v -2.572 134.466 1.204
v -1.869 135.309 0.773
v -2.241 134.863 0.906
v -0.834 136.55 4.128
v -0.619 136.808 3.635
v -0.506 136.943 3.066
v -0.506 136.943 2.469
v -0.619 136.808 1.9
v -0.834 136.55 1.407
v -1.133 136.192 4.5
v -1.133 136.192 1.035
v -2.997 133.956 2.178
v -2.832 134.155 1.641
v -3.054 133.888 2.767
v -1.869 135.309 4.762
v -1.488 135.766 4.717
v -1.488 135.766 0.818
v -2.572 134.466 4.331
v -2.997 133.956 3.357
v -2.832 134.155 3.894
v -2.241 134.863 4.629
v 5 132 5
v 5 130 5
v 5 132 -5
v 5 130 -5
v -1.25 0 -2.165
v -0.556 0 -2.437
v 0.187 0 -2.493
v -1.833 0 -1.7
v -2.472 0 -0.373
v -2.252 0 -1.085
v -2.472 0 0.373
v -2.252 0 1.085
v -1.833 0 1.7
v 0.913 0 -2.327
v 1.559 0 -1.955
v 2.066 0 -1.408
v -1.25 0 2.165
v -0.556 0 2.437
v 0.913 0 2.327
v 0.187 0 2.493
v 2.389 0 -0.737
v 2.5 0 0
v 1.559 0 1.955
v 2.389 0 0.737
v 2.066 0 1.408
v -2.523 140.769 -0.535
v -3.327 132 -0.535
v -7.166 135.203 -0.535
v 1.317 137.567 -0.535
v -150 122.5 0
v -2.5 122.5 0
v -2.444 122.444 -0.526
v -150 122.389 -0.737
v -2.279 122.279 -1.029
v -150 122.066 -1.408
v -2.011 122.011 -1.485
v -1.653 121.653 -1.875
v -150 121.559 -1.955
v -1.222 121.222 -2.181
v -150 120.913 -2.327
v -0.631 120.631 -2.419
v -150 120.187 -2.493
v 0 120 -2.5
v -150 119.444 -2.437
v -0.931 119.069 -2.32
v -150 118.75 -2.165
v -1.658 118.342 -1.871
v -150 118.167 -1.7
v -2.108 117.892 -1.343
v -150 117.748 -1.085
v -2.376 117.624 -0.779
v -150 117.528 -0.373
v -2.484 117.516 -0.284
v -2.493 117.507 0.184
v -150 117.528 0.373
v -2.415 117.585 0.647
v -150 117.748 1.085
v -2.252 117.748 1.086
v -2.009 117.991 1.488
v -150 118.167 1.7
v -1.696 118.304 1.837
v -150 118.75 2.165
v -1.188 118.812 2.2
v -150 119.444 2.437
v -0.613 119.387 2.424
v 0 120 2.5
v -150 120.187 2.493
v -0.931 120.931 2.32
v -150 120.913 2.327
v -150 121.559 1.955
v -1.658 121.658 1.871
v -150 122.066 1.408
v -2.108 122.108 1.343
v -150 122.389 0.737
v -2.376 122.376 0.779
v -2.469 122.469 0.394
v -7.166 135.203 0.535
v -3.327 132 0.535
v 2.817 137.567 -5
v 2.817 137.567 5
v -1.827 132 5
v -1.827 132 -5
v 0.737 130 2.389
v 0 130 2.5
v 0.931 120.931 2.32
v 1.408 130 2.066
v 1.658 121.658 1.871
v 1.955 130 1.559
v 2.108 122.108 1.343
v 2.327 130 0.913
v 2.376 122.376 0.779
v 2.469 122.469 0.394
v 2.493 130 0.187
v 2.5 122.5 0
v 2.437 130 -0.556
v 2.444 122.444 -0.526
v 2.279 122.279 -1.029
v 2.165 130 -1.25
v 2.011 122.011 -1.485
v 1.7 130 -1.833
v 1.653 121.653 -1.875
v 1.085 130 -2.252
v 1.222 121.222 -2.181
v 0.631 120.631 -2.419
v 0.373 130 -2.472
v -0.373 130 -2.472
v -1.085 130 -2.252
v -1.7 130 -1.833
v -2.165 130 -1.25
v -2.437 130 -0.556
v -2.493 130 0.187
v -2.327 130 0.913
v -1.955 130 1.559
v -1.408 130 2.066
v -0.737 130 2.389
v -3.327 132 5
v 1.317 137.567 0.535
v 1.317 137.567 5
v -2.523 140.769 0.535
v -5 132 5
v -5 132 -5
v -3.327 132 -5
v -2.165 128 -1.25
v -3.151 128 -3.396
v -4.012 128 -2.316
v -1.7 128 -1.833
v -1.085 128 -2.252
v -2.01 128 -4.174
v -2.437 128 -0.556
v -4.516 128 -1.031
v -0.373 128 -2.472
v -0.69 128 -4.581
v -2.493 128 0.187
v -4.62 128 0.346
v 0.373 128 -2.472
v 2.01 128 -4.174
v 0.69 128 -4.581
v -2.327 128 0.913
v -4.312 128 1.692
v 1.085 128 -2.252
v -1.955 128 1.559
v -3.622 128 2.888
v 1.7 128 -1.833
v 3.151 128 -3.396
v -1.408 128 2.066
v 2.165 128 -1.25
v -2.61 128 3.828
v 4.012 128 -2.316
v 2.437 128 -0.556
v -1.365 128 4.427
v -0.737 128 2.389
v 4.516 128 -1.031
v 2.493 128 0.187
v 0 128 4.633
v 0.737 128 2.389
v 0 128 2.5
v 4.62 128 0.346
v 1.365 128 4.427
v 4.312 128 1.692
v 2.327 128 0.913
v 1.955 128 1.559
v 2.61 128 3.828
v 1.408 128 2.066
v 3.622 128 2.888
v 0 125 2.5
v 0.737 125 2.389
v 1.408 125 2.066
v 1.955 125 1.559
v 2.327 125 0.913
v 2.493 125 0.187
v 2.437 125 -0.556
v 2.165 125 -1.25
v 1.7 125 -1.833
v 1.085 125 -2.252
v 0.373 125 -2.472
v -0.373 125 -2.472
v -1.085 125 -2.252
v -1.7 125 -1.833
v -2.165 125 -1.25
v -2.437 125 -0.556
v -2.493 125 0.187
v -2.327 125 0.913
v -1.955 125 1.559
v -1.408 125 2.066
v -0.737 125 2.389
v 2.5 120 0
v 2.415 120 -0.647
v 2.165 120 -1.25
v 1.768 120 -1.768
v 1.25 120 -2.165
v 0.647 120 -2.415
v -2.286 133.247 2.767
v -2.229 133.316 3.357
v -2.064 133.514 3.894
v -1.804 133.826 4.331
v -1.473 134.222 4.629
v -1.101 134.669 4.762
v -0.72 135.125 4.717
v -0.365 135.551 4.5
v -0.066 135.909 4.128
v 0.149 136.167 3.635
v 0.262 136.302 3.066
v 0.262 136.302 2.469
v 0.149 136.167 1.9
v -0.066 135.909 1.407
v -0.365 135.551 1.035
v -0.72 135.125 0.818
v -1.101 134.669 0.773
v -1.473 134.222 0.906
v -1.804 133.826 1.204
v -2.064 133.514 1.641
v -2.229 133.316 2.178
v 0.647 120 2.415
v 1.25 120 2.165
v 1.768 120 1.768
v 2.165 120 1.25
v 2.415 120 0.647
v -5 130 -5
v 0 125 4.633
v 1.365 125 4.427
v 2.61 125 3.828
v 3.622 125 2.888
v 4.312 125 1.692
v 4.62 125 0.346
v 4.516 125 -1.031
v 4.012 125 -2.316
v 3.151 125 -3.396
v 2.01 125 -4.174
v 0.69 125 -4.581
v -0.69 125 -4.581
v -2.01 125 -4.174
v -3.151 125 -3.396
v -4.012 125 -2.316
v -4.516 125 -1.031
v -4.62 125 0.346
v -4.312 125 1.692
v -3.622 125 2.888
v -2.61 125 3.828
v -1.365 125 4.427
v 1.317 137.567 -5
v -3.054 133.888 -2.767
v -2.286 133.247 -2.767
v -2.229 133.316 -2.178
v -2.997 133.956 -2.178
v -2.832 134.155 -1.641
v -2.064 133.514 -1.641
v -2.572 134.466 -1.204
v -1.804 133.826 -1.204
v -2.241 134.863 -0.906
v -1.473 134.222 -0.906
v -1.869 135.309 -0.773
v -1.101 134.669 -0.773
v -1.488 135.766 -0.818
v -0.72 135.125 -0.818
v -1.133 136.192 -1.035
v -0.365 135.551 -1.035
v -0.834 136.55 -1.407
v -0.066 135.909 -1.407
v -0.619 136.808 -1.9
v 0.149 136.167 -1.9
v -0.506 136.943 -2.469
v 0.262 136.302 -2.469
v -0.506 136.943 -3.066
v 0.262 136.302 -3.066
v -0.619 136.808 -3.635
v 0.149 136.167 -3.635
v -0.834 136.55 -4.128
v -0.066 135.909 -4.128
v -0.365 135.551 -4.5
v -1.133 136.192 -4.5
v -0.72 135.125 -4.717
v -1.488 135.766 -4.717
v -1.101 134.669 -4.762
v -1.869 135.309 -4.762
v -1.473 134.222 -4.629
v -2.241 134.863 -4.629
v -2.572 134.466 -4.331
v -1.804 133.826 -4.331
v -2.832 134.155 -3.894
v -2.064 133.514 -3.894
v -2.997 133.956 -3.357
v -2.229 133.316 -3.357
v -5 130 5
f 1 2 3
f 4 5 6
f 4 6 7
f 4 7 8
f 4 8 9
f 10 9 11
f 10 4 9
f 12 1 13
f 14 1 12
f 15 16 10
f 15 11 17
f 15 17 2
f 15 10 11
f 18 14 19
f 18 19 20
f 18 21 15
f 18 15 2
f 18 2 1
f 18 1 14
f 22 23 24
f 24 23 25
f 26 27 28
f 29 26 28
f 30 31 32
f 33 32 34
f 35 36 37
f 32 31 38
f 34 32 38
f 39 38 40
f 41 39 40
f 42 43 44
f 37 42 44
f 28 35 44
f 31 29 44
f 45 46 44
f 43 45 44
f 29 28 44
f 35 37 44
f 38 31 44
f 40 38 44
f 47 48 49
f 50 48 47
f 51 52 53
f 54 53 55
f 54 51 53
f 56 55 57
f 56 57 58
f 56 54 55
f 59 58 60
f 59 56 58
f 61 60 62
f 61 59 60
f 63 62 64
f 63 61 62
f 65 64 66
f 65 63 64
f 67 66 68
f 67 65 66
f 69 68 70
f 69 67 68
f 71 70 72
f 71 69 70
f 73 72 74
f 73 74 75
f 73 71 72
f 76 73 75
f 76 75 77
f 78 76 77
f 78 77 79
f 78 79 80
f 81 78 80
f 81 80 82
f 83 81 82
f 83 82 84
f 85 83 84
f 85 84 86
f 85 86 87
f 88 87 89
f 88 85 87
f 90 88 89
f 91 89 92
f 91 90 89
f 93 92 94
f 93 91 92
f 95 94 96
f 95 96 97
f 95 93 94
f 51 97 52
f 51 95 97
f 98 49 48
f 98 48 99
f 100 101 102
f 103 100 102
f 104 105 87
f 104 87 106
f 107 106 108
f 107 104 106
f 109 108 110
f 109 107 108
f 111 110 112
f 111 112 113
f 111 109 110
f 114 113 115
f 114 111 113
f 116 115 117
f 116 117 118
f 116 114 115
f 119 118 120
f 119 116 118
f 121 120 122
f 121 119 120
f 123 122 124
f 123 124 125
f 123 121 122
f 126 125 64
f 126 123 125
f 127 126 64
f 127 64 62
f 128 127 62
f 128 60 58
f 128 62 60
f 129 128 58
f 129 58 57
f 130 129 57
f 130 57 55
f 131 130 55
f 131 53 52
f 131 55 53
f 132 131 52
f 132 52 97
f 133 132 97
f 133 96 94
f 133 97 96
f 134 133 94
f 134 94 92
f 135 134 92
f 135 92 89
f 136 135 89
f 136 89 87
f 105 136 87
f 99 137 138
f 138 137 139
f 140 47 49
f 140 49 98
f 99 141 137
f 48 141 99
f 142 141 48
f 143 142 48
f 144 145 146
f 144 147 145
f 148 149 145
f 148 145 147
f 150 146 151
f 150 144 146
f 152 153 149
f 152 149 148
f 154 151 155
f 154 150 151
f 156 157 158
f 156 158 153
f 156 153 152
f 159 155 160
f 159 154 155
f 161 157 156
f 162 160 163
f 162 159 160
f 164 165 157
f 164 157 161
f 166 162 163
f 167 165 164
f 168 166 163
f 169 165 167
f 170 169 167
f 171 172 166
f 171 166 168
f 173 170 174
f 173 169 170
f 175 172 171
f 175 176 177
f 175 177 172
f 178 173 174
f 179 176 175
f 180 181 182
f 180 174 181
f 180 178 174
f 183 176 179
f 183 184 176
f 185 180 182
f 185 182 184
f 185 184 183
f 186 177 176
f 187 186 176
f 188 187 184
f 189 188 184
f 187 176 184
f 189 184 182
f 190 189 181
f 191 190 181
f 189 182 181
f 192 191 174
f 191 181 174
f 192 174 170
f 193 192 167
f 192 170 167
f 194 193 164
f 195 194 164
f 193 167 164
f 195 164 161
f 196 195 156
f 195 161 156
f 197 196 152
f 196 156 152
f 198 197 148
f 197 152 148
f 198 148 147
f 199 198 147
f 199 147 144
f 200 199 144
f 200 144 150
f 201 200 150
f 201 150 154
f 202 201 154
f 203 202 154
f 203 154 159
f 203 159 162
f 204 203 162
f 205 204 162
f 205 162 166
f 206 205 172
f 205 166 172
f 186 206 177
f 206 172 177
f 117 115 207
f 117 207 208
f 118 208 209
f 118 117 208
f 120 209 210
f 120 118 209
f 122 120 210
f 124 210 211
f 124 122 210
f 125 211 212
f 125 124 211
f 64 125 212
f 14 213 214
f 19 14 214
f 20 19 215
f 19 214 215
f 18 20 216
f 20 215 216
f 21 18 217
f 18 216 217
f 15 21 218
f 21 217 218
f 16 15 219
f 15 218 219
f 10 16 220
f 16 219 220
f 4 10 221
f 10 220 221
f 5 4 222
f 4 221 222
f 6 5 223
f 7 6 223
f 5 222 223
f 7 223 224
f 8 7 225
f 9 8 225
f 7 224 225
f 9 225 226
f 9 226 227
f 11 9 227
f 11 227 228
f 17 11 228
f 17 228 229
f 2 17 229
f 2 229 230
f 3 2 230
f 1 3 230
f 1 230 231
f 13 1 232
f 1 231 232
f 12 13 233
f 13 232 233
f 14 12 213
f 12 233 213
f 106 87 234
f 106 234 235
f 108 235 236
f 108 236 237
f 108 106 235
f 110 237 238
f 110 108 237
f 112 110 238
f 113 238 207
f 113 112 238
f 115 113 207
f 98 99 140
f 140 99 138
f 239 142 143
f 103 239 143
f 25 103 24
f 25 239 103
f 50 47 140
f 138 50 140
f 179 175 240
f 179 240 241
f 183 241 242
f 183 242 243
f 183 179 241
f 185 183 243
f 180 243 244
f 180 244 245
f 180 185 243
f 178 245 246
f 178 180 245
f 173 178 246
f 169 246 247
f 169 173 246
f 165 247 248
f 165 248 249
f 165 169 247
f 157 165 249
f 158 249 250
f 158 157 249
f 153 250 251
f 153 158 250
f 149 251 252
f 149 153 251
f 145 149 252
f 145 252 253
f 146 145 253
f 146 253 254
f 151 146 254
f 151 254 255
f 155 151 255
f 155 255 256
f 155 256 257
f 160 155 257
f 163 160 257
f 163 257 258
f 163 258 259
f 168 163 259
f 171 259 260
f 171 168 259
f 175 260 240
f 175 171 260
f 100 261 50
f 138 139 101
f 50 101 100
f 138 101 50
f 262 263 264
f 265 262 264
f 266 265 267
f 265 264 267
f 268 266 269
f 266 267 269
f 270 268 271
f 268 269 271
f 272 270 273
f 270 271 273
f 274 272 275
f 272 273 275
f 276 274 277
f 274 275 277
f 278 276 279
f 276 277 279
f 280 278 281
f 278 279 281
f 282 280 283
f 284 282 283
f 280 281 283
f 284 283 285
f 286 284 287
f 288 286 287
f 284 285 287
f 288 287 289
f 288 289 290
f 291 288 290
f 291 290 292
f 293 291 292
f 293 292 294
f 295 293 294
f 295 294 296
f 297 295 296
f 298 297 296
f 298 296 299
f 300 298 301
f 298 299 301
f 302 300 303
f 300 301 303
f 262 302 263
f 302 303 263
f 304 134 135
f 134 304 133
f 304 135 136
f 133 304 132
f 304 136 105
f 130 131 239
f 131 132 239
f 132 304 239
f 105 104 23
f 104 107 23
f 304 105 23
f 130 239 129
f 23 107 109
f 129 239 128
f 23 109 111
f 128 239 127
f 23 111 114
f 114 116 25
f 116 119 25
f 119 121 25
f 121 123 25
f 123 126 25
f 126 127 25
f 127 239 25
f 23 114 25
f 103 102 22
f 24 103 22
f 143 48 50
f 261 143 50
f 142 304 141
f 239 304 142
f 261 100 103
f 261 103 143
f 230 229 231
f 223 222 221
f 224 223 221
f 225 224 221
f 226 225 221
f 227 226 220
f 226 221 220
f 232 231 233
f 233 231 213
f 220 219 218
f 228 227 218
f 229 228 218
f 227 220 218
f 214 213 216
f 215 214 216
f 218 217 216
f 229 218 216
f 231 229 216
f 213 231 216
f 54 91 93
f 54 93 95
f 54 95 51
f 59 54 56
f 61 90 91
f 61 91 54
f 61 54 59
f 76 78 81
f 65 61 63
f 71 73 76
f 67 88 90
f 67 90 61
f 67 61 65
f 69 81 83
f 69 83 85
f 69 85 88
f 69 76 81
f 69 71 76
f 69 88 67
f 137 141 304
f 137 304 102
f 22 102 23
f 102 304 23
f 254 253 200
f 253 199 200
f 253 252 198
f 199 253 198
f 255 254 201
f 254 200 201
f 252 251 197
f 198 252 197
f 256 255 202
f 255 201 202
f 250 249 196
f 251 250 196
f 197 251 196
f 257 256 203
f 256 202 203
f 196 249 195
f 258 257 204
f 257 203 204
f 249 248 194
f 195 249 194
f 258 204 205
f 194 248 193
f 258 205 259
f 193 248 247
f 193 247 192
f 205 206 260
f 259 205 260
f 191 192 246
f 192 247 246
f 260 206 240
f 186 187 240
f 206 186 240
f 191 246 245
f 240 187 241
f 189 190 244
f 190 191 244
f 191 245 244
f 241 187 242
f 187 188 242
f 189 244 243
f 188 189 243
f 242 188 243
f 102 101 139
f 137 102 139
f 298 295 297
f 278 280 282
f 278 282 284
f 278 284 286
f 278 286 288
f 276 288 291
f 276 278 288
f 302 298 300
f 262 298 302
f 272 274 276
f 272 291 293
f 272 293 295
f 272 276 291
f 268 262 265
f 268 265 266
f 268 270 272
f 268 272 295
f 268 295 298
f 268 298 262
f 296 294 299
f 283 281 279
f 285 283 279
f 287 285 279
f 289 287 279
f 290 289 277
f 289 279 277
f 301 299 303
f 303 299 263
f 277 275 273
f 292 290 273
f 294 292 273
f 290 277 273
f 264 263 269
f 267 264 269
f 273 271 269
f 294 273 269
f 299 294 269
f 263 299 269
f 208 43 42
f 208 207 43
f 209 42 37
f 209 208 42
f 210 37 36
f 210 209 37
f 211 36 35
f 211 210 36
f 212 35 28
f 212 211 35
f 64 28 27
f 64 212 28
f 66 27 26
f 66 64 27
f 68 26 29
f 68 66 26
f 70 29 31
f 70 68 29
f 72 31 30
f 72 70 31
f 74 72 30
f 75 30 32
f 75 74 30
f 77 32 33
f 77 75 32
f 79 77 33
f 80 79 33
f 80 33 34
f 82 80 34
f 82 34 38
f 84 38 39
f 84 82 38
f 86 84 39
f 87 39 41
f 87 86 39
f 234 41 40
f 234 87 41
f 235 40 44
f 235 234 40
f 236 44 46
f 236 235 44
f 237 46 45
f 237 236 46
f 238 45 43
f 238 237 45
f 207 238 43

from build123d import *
from build123d.topology import SkipClean

# Parameters (mm, degrees)
SKETCH1_R           = 2.5
SKETCH3_R           = 2.5
BOSS_EXTRUDE1_DEPTH = 10
BOSS_EXTRUDE2_START = -2
SKETCH4_R           = 4.632532926
SKETCH4_R_2         = 2.5
BOSS_EXTRUDE2_DEPTH = 3
SKETCH5_W           = 10
SKETCH5_H           = 10
BOSS_EXTRUDE3_DEPTH = 2
BOSS_EXTRUDE4_DEPTH = 10
SKETCH7_W           = 1.069840708
SKETCH7_H           = 7.249028467
BOSS_EXTRUDE5_DEPTH = 5
SKETCH9_R           = 2
BOSS_EXTRUDE7_DEPTH = 1
SKETCH10_R          = 2
BOSS_EXTRUDE8_DEPTH = 1


with BuildPart() as part:
    # Sweep1: sweep along a path in Sketch2
    with BuildLine(Plane.XY) as sweep1_path:
        Line((0, 0), (0, 120))
        Line((0, 120), (-150, 120))
    # Sketch1 → Sweep1 (sweep)
    with BuildSketch(Plane(origin=(0, 0, 0), x_dir=(1, 0, 0), z_dir=(0, 1, 0))):
        Circle(SKETCH1_R)
    sweep(path=sweep1_path.line, transition=Transition.RIGHT)

    # Sketch3 → Boss-Extrude1 (add)
    with SkipClean():  # the faces are left unmerged after this step: merging them gives an invalid solid
        with BuildSketch(Plane(origin=(0, 130, 0), x_dir=(1, 0, 0), z_dir=(0, 1, 0))):
            with Locations(Location((0, 0, 0), (0, 0, 270))):
                Circle(SKETCH3_R)
        extrude(amount=-BOSS_EXTRUDE1_DEPTH)

    # Sketch5 → Boss-Extrude3 (add)
    with SkipClean():  # the faces are left unmerged after this step: merging them gives an invalid solid
        with BuildSketch(Plane(origin=(0, 130, 0), x_dir=(1, 0, 0), z_dir=(0, 1, 0))):
            Rectangle(SKETCH5_W, SKETCH5_H)
        extrude(amount=BOSS_EXTRUDE3_DEPTH)

    # Sketch6 → Boss-Extrude4 (add, through all)
    with SkipClean():  # the faces are left unmerged after this step: merging them gives an invalid solid
        with BuildSketch(Plane.XY.offset(5)):
            Polygon((-3.326842141, 132), (1.316524912, 137.566646758), (2.816524912, 137.566646758), (-1.826842141, 132), align=None)
        extrude(amount=-BOSS_EXTRUDE4_DEPTH)

    # Sketch7 → Boss-Extrude5 (add)
    with SkipClean():  # the faces are left unmerged after this step: merging them gives an invalid solid
        with BuildSketch(Plane(origin=(-66.891165059, 55.796648403, 0), x_dir=(0, 0, 1), z_dir=(-0.7679162502207892, 0.6405502577057027, 0))):
            with Locations((0, 102.858449672)):
                Rectangle(SKETCH7_W, SKETCH7_H)
        extrude(amount=BOSS_EXTRUDE5_DEPTH)


with BuildPart() as body_2:
    # Sketch4 → Boss-Extrude2 (new body)
    with BuildSketch(Plane(origin=(0, 130, 0), x_dir=(1, 0, 0), z_dir=(0, 1, 0)).offset(BOSS_EXTRUDE2_START)):
        with Locations(Location((0, 0, 0), (0, 0, 270))):
            Circle(SKETCH4_R)
        with Locations(Location((0, 0, 0), (0, 0, 270))):
            Circle(SKETCH4_R_2, mode=Mode.SUBTRACT)
    extrude(amount=-BOSS_EXTRUDE2_DEPTH)


with BuildPart() as body_3:
    # Sketch9 → Boss-Extrude7 (new body)
    with BuildSketch(Plane(origin=(-66.891165059, 55.796648403, 0), x_dir=(0, 0, 1), z_dir=(-0.7679162502207892, 0.6405502577057027, 0))):
        with Locations(Location((-2.767460177, 102.858449672, 0), (0, 0, 270))):
            Circle(SKETCH9_R)
    extrude(amount=BOSS_EXTRUDE7_DEPTH)


with BuildPart() as body_4:
    # Sketch10 → Boss-Extrude8 (new body)
    with BuildSketch(Plane(origin=(-66.891165059, 55.796648403, 0), x_dir=(0, 0, 1), z_dir=(-0.7679162502207892, 0.6405502577057027, 0))):
        with Locations(Location((2.767460177, 102.858449672, 0), (0, 0, 270))):
            Circle(SKETCH10_R)
    extrude(amount=BOSS_EXTRUDE8_DEPTH)


solid = Compound([part.part, body_2.part, body_3.part, body_4.part])
